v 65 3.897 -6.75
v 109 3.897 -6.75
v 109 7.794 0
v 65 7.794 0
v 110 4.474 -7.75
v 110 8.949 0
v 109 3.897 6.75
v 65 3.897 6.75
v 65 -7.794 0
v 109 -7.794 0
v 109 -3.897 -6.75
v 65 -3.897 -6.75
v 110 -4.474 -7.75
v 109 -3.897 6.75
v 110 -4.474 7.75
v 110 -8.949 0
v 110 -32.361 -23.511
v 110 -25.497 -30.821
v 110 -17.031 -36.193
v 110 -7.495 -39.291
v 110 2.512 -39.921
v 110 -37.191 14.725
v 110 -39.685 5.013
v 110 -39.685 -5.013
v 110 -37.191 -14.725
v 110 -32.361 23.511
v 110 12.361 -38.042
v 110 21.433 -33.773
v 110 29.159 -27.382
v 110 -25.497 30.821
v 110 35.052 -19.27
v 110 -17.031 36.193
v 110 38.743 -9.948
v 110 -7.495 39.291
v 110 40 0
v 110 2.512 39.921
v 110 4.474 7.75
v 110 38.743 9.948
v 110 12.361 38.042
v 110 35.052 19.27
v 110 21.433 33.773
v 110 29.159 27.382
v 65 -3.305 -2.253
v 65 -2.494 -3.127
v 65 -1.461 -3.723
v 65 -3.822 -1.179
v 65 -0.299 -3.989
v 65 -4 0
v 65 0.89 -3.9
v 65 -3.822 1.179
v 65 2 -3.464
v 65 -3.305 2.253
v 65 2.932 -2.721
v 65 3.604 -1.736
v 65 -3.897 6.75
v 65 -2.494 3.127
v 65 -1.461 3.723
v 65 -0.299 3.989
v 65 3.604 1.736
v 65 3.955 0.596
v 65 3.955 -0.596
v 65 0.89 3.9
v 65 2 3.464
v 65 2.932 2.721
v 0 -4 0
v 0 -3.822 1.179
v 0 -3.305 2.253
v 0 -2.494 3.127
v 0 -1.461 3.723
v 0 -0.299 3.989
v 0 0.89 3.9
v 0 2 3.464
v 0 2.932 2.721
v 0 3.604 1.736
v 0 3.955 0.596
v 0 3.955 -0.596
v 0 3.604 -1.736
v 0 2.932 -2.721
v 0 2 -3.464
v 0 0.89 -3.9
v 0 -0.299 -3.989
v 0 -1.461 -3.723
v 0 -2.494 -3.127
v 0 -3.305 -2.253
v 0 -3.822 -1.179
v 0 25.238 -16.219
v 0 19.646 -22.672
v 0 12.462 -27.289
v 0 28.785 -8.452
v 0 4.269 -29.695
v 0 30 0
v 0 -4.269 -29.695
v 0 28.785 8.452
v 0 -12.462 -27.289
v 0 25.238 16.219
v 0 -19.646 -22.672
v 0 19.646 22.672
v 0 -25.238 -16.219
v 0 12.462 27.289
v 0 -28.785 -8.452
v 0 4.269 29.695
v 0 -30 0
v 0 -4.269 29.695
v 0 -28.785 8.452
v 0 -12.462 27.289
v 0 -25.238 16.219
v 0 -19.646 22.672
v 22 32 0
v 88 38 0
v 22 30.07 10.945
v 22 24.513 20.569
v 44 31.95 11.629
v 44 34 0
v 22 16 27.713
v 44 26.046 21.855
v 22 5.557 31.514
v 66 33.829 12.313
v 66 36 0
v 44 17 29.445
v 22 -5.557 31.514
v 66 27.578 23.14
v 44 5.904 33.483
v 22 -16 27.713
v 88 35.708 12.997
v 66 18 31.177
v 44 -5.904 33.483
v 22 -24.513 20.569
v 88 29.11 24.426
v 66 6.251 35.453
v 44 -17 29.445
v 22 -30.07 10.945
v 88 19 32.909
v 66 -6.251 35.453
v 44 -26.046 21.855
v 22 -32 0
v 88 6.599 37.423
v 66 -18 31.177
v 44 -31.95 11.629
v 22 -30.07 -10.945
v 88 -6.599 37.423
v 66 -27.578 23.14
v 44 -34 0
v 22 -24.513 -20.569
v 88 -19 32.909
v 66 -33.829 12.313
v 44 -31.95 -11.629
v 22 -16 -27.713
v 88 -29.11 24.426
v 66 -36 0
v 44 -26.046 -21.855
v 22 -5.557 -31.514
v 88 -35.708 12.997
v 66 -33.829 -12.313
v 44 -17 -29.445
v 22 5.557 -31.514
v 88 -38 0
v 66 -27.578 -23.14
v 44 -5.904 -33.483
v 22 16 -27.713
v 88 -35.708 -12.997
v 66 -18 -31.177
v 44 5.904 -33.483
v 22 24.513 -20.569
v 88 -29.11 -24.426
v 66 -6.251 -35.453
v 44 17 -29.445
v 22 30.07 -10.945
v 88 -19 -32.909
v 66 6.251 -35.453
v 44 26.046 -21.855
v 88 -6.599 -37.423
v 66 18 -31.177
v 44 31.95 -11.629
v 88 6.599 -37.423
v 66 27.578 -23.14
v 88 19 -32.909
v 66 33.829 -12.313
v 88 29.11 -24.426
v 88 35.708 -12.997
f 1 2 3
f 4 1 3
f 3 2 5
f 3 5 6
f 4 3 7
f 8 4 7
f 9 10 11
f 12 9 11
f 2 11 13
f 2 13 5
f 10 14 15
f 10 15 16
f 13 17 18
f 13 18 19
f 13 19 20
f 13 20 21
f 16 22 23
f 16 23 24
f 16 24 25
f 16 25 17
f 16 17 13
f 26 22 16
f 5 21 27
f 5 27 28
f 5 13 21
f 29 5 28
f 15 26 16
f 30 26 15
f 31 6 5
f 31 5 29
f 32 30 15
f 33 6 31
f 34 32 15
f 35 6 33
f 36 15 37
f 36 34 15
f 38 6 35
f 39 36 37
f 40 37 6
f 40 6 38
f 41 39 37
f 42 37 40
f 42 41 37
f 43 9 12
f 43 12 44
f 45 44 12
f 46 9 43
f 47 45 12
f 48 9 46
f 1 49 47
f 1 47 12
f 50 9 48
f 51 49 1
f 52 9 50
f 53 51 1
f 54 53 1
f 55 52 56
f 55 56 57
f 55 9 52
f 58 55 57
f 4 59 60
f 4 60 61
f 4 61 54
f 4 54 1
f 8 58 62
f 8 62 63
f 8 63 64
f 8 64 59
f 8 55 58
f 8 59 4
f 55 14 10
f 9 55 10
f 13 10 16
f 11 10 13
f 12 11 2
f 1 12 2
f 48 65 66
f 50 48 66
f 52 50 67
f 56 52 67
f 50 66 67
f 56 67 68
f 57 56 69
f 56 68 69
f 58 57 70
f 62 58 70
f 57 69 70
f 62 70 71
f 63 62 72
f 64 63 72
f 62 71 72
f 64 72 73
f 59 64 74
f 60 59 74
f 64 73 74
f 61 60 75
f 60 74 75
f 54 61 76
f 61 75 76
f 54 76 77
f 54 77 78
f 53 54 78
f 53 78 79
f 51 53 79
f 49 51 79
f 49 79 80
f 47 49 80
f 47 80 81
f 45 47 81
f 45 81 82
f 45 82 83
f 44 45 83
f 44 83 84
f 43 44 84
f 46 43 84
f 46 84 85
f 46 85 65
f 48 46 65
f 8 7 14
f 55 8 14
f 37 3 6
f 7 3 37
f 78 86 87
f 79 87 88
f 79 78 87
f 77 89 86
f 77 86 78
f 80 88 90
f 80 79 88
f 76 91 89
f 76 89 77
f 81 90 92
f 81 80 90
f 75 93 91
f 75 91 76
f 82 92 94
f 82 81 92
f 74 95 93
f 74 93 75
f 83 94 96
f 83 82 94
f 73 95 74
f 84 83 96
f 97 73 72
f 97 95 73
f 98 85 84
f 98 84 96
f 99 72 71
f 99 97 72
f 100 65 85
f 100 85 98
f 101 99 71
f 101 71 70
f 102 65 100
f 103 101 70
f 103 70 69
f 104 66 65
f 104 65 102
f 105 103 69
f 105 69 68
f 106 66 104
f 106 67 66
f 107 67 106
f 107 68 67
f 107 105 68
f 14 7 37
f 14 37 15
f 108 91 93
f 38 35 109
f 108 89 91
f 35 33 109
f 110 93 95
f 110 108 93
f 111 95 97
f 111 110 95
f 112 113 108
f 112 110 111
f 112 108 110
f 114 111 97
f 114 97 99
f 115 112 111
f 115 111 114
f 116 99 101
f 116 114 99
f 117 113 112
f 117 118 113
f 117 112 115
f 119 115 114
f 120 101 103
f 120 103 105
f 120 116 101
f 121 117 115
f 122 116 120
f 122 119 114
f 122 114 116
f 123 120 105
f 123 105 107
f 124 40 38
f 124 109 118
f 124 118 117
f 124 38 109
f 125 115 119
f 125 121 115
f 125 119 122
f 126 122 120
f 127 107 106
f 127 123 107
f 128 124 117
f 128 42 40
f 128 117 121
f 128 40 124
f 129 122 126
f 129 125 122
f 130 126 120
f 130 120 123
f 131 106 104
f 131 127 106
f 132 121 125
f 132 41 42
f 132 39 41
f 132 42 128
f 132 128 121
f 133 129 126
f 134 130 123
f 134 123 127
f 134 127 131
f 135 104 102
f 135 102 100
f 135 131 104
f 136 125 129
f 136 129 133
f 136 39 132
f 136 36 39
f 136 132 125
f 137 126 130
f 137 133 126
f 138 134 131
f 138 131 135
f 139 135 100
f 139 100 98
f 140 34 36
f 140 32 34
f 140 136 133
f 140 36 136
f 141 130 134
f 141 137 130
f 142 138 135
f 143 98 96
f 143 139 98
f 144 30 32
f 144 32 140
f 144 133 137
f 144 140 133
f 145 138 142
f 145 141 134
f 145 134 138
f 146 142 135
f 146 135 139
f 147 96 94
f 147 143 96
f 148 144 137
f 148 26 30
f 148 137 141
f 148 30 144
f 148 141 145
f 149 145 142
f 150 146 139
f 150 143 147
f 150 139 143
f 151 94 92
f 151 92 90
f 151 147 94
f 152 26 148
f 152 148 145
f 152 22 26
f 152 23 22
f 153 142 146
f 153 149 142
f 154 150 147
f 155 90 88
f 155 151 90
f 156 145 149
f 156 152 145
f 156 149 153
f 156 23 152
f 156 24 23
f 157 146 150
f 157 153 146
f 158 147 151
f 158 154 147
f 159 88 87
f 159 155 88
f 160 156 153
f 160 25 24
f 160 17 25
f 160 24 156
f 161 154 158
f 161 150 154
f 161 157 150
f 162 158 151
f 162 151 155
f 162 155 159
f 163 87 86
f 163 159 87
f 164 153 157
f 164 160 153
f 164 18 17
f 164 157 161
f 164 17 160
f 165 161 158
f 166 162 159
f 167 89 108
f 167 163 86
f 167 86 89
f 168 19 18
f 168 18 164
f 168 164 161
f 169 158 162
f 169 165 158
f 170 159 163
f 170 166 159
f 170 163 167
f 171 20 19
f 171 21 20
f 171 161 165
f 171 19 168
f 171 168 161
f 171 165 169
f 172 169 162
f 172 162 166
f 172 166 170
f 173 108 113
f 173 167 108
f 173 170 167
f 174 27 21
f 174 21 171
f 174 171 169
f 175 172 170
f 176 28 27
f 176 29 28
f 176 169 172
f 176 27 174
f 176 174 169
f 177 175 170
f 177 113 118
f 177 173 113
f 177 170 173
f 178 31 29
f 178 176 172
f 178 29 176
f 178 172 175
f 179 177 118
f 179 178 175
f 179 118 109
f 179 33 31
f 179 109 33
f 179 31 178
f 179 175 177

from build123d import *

# Parameters (mm, degrees)
SKETCH001_R     = 4
POCKET_DEPTH    = 110
POCKET001_DEPTH = 45
CHAMFER_SIZE    = 1


with BuildPart() as part:
    # Sketch → Revolution (revolve)
    with BuildSketch(Plane.XY):
        Polygon((0, 0), (0, 30), (110, 40), (110, 0), align=None)
    revolve(axis=Axis((0, 0, 0), (1, 0, 0)))

    # Sketch001 (on Face1 of Revolution) → Pocket (cut)
    with BuildSketch(Plane(origin=(0, 0, 0), x_dir=(0, -1, 0), z_dir=(-1, 0, 0))):
        Circle(SKETCH001_R)
    extrude(amount=-POCKET_DEPTH, mode=Mode.SUBTRACT)

    # Sketch002 (on Face4 of Pocket) → Pocket001 (cut)
    with BuildSketch(Plane.YZ.offset(110)):
        Polygon((3.897114, 6.75), (-3.897114, 6.75), (-7.794229, 0), (-3.897114, -6.75), (3.897114, -6.75), (7.794229, 0), align=None)
    extrude(amount=-POCKET001_DEPTH, mode=Mode.SUBTRACT)

    # Chamfer
    chamfer_edges = [part.edges().sort_by_distance(p)[0] for p in [
        (110, 0, -6.75),
        (110, 0, 6.75),
        (110, 5.845671, 3.375),
        (110, 5.845671, -3.375),
        (110, -5.845671, 3.375),
        (110, -5.845671, -3.375),
    ]]
    chamfer(chamfer_edges, length=CHAMFER_SIZE)


solid = part.part
